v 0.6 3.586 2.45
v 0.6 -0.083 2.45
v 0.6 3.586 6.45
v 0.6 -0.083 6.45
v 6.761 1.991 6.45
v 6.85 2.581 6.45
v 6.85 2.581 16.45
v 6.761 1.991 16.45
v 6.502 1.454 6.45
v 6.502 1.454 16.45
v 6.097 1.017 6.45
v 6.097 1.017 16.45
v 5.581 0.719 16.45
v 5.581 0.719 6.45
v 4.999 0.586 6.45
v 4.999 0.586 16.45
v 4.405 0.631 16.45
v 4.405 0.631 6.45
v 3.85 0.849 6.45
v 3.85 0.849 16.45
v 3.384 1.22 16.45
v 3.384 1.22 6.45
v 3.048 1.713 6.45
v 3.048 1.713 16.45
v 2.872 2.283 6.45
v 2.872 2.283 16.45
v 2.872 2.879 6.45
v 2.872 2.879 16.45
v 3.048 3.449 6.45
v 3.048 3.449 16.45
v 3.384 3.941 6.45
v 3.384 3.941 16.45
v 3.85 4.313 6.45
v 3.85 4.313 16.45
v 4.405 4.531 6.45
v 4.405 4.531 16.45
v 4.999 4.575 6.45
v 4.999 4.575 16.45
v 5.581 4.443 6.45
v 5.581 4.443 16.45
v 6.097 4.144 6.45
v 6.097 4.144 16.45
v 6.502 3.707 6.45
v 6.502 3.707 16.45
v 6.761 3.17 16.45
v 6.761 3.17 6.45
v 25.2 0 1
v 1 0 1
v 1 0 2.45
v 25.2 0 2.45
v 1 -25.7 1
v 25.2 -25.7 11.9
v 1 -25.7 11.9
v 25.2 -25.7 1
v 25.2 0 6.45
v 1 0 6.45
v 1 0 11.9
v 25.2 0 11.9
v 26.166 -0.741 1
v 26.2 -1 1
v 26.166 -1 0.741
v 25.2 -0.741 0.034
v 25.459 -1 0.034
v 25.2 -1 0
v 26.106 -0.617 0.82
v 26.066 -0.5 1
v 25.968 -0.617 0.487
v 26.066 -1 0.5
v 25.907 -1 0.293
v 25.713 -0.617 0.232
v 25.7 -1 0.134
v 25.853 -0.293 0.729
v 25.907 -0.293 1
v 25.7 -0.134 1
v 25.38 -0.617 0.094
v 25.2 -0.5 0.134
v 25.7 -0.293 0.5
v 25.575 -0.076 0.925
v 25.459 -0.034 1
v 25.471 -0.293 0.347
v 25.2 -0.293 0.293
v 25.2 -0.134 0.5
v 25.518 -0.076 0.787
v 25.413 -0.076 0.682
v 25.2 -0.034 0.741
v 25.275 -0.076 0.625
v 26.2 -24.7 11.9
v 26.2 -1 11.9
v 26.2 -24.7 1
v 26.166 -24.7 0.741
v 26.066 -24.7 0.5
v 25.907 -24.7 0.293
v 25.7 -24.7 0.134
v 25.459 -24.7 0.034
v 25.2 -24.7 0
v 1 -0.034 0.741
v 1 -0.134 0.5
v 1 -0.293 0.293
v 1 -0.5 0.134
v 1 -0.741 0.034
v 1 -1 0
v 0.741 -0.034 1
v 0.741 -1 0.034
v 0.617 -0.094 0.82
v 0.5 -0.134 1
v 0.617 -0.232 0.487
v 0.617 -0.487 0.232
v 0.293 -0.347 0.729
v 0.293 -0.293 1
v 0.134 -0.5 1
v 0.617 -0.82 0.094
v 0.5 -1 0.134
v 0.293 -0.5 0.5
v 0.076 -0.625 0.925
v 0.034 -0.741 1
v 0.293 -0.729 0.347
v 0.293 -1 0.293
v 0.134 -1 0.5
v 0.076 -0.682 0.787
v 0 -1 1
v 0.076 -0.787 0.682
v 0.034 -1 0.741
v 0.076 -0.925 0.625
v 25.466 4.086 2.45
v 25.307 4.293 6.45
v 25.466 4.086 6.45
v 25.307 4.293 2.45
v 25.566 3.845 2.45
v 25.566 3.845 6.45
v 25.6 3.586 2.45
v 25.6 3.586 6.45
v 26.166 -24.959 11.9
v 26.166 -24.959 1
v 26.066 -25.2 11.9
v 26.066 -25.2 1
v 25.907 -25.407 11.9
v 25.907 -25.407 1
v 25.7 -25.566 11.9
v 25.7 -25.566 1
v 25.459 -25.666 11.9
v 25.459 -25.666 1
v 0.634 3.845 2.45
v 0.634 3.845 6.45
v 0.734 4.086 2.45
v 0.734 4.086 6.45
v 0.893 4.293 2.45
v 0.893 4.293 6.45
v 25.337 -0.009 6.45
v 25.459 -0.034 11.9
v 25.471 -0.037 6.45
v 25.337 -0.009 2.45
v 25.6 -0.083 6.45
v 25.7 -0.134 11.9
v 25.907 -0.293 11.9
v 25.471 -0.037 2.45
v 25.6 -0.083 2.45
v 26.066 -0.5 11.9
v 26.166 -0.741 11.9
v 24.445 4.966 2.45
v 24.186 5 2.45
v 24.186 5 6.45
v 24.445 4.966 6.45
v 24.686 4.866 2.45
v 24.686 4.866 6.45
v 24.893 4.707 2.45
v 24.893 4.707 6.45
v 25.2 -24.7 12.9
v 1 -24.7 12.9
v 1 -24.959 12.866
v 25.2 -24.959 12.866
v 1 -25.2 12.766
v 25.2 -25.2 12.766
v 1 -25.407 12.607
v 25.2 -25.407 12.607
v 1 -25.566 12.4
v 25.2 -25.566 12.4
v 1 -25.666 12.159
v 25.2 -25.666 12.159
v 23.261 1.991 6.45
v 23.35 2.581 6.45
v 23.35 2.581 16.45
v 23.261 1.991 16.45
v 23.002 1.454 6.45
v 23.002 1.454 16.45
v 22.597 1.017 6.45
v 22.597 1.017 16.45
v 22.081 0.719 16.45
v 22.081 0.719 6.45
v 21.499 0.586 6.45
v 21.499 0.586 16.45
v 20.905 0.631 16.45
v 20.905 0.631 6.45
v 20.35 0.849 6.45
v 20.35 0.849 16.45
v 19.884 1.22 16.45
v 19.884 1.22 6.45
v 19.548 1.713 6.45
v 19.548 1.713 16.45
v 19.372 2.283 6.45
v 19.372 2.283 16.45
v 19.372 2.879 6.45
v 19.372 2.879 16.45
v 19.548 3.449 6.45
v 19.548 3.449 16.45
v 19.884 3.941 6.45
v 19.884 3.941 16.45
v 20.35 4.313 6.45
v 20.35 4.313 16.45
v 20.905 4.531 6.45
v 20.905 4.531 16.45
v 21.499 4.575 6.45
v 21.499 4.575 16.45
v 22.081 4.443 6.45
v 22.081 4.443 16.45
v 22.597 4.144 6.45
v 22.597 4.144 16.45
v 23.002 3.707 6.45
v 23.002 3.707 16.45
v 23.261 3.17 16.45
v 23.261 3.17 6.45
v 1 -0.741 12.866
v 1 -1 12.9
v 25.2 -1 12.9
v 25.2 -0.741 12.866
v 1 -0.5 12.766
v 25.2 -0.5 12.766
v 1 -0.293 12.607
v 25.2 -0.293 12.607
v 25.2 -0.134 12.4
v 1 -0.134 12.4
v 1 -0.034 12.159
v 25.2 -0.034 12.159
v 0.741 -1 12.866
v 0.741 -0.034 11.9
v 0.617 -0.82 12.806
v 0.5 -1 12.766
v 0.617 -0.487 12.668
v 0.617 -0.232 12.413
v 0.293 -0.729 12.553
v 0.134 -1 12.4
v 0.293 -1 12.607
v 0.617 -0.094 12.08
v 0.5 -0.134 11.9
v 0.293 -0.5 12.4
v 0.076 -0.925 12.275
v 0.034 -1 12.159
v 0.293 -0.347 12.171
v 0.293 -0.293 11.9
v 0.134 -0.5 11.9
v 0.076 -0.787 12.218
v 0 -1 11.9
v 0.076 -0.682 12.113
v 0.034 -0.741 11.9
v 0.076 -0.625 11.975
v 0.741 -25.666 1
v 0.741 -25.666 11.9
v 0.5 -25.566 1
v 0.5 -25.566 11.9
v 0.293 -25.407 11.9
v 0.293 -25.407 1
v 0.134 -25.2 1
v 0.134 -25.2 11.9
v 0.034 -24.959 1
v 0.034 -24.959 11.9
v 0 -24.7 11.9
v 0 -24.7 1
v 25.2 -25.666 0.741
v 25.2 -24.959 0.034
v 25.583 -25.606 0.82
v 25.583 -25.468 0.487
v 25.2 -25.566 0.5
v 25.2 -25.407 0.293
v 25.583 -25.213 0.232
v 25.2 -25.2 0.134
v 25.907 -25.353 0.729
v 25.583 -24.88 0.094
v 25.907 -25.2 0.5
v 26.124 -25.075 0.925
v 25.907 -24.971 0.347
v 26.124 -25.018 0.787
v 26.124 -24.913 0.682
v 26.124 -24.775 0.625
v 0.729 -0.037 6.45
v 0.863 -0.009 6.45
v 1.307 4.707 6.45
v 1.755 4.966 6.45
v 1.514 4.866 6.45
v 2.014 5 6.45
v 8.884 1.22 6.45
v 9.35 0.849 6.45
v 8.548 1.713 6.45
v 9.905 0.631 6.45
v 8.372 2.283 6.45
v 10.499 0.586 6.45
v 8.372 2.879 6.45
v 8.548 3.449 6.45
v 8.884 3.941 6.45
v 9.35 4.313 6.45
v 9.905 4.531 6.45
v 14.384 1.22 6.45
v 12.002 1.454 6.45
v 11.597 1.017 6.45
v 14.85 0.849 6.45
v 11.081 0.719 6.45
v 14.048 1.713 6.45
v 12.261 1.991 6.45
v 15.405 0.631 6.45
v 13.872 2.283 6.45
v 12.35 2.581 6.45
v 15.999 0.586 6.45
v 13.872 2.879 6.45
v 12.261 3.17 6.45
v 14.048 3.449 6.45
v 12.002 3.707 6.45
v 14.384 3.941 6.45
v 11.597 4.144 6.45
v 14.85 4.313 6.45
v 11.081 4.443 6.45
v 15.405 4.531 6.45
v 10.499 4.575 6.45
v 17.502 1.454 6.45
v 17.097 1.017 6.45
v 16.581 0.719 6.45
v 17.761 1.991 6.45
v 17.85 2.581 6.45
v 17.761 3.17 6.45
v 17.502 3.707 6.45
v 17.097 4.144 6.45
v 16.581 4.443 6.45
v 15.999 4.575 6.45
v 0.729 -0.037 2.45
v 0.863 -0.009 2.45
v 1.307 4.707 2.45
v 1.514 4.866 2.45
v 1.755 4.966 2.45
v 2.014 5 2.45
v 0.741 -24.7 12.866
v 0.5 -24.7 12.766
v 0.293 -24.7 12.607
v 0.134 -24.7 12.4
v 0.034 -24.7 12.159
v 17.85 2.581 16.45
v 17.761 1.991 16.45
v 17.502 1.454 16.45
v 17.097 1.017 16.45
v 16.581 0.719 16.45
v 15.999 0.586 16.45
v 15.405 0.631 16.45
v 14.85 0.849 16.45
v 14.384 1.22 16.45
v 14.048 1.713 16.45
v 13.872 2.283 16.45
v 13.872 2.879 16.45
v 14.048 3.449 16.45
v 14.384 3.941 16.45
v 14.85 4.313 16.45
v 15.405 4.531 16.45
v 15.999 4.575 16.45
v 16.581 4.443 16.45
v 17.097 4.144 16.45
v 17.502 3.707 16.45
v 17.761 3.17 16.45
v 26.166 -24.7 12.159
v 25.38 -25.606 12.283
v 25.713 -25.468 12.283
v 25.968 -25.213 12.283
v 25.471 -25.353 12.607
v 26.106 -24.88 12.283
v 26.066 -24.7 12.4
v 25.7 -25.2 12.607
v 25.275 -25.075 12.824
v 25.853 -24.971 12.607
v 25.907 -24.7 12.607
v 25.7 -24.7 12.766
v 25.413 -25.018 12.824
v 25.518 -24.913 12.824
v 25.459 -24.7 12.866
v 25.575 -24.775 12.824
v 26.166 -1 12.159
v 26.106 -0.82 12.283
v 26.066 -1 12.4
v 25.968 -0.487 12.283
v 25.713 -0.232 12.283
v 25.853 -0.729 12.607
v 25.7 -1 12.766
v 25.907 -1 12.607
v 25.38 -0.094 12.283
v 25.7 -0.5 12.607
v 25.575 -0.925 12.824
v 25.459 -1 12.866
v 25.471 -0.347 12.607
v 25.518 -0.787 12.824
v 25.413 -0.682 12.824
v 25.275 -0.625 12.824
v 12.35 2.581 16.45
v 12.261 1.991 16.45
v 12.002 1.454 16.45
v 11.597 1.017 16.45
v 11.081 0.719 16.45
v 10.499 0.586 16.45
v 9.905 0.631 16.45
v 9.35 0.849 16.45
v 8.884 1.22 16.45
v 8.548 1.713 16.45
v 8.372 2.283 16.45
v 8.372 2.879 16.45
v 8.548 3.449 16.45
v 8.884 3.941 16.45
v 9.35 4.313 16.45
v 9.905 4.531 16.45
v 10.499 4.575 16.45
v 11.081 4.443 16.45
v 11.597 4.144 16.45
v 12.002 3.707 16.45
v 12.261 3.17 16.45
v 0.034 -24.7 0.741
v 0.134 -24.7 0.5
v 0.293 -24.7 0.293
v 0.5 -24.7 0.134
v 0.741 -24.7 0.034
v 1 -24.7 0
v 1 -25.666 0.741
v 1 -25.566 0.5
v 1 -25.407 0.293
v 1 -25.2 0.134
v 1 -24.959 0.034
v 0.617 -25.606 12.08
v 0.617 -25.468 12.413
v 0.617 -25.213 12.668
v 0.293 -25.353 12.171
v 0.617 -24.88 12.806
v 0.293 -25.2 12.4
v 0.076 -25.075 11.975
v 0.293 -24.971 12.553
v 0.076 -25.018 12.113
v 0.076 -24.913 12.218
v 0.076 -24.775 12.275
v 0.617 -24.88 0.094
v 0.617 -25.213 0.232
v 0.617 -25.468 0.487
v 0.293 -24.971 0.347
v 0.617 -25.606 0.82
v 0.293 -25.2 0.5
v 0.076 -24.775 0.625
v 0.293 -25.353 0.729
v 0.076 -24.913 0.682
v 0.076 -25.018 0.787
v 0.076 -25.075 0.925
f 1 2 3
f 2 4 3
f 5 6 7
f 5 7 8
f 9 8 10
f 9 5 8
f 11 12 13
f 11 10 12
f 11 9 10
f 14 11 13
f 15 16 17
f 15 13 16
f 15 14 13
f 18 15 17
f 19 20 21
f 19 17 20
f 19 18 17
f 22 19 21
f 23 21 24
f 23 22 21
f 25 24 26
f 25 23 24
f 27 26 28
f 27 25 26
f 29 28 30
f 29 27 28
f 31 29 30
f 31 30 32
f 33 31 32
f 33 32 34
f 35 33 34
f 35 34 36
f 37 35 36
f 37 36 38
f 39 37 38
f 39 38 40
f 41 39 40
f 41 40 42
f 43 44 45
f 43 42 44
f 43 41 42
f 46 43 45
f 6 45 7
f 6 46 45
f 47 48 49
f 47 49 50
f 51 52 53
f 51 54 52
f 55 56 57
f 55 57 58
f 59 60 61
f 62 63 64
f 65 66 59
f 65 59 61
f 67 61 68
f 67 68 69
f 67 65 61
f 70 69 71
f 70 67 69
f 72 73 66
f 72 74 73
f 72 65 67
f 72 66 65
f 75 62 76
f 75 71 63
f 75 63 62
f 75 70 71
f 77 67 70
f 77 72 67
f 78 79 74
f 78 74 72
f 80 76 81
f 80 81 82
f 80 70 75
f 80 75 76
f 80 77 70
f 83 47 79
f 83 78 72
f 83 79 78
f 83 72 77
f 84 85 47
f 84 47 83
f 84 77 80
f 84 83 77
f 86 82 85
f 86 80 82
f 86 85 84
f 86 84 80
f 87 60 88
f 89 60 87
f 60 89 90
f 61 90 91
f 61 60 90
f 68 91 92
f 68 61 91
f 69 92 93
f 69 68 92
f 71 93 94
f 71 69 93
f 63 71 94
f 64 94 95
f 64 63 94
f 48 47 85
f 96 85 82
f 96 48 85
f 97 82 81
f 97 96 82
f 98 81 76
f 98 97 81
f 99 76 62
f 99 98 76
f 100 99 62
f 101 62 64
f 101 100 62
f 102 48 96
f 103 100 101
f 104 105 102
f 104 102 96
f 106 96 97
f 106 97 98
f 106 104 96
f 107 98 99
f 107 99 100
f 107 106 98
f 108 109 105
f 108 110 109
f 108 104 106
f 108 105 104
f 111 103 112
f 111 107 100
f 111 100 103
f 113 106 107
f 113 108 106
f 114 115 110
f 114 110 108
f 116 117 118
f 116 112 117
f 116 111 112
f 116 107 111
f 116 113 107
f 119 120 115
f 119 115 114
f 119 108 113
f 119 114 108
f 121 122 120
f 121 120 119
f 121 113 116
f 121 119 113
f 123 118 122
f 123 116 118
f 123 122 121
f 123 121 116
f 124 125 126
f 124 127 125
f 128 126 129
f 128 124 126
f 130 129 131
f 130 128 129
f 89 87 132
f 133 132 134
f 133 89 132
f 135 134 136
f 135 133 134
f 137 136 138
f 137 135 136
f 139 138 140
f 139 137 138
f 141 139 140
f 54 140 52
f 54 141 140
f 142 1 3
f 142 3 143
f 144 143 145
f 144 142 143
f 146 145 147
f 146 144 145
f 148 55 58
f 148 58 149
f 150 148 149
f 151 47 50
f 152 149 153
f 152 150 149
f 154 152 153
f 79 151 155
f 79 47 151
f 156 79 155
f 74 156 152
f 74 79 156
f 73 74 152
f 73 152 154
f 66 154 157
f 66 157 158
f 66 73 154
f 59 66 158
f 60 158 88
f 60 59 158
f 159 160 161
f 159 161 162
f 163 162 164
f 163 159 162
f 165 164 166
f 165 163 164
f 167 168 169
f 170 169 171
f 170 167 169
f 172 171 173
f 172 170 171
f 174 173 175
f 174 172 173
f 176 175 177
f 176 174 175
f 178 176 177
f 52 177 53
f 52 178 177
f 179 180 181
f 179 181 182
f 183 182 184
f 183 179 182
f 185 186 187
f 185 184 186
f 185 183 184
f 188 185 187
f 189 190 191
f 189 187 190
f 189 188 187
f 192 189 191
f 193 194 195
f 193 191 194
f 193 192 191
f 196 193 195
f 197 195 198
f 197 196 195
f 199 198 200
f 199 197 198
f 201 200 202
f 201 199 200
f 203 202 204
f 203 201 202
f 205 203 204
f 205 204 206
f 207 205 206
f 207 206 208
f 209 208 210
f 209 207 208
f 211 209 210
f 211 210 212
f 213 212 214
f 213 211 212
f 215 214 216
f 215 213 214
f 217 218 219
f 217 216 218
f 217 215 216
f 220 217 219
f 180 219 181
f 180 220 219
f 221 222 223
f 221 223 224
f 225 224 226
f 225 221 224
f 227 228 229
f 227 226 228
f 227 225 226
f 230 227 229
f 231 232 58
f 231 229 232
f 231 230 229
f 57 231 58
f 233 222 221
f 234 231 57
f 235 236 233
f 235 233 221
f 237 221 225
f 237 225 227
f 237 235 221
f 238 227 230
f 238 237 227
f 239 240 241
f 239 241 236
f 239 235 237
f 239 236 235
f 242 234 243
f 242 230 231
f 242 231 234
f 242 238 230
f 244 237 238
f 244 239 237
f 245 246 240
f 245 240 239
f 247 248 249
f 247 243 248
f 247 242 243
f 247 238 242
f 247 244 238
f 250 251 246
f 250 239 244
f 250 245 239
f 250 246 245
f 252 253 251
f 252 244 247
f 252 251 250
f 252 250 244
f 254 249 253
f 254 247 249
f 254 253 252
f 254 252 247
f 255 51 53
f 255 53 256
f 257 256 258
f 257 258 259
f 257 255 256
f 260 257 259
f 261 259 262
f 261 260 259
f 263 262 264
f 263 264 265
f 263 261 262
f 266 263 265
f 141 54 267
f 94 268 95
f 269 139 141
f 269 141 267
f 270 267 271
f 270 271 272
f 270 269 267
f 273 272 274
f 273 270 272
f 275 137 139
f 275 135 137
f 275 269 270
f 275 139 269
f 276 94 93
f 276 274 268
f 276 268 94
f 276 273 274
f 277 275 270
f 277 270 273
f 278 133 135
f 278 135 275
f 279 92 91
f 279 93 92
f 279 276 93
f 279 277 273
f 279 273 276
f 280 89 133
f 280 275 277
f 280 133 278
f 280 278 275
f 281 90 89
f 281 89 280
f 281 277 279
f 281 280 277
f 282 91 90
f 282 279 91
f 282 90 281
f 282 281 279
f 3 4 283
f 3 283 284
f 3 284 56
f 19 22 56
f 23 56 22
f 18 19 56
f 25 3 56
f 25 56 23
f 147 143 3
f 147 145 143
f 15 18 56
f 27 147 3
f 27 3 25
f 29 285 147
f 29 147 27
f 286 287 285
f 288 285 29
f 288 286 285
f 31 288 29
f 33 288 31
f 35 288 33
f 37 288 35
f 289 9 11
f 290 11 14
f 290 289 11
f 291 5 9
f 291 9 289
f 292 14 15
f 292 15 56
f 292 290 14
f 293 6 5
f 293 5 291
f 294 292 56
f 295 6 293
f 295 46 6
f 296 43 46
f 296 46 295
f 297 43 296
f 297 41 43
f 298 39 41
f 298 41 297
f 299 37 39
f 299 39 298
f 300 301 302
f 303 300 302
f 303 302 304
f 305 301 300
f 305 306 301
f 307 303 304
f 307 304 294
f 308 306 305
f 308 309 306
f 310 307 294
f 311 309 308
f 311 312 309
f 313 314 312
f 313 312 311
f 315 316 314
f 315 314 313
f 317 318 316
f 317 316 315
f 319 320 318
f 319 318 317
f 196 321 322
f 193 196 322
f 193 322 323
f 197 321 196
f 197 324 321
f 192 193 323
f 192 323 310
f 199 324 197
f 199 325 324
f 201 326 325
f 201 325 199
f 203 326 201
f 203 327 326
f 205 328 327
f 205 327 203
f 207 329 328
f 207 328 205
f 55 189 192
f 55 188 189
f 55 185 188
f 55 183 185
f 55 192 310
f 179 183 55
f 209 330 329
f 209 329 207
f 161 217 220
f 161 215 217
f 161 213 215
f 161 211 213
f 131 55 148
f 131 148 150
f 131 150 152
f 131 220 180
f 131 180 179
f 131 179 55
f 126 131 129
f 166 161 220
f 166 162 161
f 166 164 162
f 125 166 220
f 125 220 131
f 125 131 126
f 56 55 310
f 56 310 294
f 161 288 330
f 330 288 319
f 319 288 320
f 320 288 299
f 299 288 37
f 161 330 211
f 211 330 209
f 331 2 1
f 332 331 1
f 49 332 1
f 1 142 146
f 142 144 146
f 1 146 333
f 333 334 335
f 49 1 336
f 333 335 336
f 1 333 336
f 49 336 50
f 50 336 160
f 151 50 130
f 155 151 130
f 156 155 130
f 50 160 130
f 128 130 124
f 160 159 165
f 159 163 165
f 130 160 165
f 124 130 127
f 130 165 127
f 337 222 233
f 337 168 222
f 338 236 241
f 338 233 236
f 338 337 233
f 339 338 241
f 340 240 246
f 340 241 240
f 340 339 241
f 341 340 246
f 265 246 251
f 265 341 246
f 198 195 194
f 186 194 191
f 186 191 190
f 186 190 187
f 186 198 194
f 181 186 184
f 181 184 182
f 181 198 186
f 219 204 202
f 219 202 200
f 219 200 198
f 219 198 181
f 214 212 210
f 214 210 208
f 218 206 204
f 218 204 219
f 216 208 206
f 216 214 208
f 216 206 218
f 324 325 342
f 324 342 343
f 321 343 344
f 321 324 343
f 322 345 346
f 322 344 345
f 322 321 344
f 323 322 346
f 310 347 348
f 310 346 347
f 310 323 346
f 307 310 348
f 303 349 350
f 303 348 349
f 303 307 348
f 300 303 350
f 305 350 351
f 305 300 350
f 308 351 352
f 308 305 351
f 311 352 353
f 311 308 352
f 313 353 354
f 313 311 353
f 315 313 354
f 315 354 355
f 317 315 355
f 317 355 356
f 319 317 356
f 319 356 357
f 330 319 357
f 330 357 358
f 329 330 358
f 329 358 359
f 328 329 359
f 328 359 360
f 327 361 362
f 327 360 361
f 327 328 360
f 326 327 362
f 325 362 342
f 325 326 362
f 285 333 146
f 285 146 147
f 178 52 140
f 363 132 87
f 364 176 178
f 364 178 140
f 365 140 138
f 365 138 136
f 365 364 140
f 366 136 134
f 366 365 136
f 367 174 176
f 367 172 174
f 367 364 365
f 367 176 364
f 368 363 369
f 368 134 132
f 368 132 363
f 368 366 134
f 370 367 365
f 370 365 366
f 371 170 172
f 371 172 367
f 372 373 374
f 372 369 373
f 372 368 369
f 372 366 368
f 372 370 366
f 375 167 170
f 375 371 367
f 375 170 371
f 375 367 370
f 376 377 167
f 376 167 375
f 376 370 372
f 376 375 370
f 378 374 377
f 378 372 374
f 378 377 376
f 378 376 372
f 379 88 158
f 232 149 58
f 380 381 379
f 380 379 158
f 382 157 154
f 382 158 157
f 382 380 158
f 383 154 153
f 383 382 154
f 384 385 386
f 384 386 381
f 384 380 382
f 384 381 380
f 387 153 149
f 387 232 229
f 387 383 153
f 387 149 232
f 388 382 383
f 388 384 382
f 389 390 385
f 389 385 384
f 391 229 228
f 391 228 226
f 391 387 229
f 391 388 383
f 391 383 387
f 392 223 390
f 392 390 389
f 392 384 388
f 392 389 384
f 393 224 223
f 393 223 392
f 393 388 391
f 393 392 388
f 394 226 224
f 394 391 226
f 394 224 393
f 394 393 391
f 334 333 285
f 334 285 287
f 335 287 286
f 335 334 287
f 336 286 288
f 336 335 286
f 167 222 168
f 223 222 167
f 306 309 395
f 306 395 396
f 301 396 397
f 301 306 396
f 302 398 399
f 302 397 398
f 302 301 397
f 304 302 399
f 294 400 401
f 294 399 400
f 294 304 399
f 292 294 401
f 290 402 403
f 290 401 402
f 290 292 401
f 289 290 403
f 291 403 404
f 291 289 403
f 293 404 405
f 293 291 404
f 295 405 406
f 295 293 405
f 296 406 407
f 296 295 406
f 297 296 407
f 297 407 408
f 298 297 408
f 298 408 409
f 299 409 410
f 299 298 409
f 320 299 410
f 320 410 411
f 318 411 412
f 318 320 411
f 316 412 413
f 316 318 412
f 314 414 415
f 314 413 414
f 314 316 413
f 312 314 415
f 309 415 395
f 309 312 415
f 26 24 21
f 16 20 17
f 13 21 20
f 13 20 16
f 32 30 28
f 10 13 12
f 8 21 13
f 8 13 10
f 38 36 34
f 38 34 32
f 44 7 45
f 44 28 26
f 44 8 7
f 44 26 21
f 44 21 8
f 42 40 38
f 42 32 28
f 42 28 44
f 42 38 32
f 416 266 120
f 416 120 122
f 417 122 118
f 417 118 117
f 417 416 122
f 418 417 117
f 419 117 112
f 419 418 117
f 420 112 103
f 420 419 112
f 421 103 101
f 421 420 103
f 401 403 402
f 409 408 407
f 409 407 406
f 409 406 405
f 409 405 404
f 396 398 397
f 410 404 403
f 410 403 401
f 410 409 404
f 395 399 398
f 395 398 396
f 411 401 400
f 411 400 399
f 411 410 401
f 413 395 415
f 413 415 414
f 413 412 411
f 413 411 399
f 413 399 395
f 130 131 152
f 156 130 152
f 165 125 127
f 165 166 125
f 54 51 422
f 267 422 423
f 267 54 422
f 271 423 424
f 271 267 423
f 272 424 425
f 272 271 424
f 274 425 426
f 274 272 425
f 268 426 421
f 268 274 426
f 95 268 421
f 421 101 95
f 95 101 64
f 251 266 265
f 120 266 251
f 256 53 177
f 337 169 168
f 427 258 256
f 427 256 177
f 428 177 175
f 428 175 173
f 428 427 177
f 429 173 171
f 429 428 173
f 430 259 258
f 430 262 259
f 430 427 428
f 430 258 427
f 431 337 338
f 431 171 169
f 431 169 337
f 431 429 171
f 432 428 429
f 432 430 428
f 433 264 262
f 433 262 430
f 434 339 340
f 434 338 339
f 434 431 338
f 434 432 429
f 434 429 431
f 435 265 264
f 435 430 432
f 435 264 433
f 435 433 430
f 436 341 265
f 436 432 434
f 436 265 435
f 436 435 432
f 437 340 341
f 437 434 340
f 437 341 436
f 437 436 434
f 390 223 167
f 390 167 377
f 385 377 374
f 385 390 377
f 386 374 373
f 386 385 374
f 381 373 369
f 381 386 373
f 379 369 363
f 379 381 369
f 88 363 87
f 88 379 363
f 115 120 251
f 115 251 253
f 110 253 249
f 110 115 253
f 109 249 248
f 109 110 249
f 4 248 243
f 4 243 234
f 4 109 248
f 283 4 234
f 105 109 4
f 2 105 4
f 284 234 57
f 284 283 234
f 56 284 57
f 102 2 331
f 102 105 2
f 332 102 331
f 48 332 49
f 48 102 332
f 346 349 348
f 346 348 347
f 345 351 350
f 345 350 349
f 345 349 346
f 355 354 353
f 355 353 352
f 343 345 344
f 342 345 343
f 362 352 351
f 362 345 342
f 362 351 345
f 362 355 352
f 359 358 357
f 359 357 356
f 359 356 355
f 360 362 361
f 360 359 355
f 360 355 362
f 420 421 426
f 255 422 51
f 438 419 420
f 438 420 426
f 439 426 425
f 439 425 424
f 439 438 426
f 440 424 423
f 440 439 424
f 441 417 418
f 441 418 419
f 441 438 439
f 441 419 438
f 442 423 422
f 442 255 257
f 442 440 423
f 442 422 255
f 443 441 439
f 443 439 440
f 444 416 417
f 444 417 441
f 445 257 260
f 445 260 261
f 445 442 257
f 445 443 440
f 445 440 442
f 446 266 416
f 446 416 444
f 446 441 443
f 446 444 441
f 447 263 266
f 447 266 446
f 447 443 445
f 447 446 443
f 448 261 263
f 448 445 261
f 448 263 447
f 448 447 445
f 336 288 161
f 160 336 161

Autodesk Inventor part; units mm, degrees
ref_plane "YZ Plane" through (0, 0, 0) normal (1, 0, 0) x (0, 1, 0)
ref_plane "XZ Plane" through (0, 0, 0) normal (0, 1, 0) x (-1, 0, 0)
sketch "スケッチ1" plane through (0, 0, 0) normal (0, 0, 1) x (1, 0, 0)
  line L0 (0, 0) -> (26.2, 0)
  line L1 (26.2, 0) -> (26.2, -25.7)
  line L2 (26.2, -25.7) -> (0, -25.7)
  line L3 (0, -25.7) -> (0, 0)
  dimension "d0" = 25.7
  dimension "d1" = 26.2
extrude "外形" add sketch "スケッチ1" along normal blind 12.9
ref_plane "作業平面1" through (0, 0, 6.45) normal (0, 0, 1) x (1, 0, 0)
sketch "スケッチ2" plane through (0, 0, 6.45) normal (0, 0, 1) x (1, 0, 0)
  line L0 (0, 0) -> (26.2, 0) projected
  line L1 (0, 0) -> (26.2, 0) projected
  line L2 (0.6, 0) -> (0.6, 5)
  line L3 (0.6, 5) -> (25.6, 5)
  line L4 (25.6, 5) -> (25.6, 0)
  line L5 (13.1, 0) -> (13.1, 3.4882)
  dimension "d5" = 5
  dimension "d6" = 25
extrude "突起部" add sketch "スケッチ2" against normal blind 4
chamfer "面取り1" distance 1 angle 45 2 edges at (0.6, 5, 4.45) (25.6, 5, 4.45)
fillet "フィレット1" radius 1 12 edges at (0, 0, 6.45) (0, -25.7, 6.45) (26.2, -25.7, 6.45) (13.1, -25.7, 12.9) (26.2, -12.85, 12.9) (26.2, -12.85, 0) (0, -12.85, 12.9) (13.1, 0, 12.9) (13.1, 0, 0) (13.1, -25.7, 0) (26.2, 0, 6.45) (0, -12.85, 0)
fillet "フィレット2" radius 1 4 edges at (25.6, 4, 4.45) (24.6, 5, 4.45) (1.6, 5, 4.45) (0.6, 4, 4.45)
sketch "スケッチ3" plane through (0, 0, 6.45) normal (0, 0, 1) x (1, 0, 0)
  arc A0 (2.0142, 5) -> (1.3071, 4.7071) centre (2.0142, 4) ccw projected
  line L0 (0.6, 4) -> (1.3071, 4.7071) projected
  line L1 (0.6, 4) -> (0.6, -0.0835) projected
  arc A1 (1, 0) -> (0.6, -0.0835) centre (1, -1) ccw projected
  line L2 (25.2, 0) -> (1, 0) projected
  arc A2 (25.6, -0.0835) -> (25.2, 0) centre (25.2, -1) ccw projected
  line L3 (25.6, -0.0835) -> (25.6, 3.5858) projected
  arc A3 (25.6, 3.5858) -> (25.3071, 4.2929) centre (24.6, 3.5858) ccw projected
  line L4 (24.8929, 4.7071) -> (25.3071, 4.2929) projected
  arc A4 (24.8929, 4.7071) -> (24.1858, 5) centre (24.1858, 4) ccw projected
  line L5 (24.1858, 5) -> (2.0142, 5) projected
  line L6 (4.85, 2.5808) -> (21.35, 2.5808)
  line L7 (13.1, 5) -> (13.1, 0.3828)
  point P0 (0, 0)
  point P1 (10.35, 2.5808)
  point P2 (15.85, 2.5808)
  dimension "d14" = 5.5
  dimension "d15" = 16.5
sketch "スケッチ4" plane through (0, 0, 6.45) normal (0, 0, 1) x (1, 0, 0)
  circle A0 centre (4.85, 2.5808) radius 2
  circle A1 centre (10.35, 2.5808) radius 2
  circle A2 centre (15.85, 2.5808) radius 2
  circle A3 centre (21.35, 2.5808) radius 2
  point P0 (0, 0)
  dimension "d16" = 4
  dimension "d17" = 4
  dimension "d18" = 4
  dimension "d19" = 4
extrude "押し出し3" add sketch "スケッチ4" along normal blind 10
equation "\"d14\" = 0.333333 * d15"
properties part number "市販回路_MC402CR" material "ABS Plastic"
